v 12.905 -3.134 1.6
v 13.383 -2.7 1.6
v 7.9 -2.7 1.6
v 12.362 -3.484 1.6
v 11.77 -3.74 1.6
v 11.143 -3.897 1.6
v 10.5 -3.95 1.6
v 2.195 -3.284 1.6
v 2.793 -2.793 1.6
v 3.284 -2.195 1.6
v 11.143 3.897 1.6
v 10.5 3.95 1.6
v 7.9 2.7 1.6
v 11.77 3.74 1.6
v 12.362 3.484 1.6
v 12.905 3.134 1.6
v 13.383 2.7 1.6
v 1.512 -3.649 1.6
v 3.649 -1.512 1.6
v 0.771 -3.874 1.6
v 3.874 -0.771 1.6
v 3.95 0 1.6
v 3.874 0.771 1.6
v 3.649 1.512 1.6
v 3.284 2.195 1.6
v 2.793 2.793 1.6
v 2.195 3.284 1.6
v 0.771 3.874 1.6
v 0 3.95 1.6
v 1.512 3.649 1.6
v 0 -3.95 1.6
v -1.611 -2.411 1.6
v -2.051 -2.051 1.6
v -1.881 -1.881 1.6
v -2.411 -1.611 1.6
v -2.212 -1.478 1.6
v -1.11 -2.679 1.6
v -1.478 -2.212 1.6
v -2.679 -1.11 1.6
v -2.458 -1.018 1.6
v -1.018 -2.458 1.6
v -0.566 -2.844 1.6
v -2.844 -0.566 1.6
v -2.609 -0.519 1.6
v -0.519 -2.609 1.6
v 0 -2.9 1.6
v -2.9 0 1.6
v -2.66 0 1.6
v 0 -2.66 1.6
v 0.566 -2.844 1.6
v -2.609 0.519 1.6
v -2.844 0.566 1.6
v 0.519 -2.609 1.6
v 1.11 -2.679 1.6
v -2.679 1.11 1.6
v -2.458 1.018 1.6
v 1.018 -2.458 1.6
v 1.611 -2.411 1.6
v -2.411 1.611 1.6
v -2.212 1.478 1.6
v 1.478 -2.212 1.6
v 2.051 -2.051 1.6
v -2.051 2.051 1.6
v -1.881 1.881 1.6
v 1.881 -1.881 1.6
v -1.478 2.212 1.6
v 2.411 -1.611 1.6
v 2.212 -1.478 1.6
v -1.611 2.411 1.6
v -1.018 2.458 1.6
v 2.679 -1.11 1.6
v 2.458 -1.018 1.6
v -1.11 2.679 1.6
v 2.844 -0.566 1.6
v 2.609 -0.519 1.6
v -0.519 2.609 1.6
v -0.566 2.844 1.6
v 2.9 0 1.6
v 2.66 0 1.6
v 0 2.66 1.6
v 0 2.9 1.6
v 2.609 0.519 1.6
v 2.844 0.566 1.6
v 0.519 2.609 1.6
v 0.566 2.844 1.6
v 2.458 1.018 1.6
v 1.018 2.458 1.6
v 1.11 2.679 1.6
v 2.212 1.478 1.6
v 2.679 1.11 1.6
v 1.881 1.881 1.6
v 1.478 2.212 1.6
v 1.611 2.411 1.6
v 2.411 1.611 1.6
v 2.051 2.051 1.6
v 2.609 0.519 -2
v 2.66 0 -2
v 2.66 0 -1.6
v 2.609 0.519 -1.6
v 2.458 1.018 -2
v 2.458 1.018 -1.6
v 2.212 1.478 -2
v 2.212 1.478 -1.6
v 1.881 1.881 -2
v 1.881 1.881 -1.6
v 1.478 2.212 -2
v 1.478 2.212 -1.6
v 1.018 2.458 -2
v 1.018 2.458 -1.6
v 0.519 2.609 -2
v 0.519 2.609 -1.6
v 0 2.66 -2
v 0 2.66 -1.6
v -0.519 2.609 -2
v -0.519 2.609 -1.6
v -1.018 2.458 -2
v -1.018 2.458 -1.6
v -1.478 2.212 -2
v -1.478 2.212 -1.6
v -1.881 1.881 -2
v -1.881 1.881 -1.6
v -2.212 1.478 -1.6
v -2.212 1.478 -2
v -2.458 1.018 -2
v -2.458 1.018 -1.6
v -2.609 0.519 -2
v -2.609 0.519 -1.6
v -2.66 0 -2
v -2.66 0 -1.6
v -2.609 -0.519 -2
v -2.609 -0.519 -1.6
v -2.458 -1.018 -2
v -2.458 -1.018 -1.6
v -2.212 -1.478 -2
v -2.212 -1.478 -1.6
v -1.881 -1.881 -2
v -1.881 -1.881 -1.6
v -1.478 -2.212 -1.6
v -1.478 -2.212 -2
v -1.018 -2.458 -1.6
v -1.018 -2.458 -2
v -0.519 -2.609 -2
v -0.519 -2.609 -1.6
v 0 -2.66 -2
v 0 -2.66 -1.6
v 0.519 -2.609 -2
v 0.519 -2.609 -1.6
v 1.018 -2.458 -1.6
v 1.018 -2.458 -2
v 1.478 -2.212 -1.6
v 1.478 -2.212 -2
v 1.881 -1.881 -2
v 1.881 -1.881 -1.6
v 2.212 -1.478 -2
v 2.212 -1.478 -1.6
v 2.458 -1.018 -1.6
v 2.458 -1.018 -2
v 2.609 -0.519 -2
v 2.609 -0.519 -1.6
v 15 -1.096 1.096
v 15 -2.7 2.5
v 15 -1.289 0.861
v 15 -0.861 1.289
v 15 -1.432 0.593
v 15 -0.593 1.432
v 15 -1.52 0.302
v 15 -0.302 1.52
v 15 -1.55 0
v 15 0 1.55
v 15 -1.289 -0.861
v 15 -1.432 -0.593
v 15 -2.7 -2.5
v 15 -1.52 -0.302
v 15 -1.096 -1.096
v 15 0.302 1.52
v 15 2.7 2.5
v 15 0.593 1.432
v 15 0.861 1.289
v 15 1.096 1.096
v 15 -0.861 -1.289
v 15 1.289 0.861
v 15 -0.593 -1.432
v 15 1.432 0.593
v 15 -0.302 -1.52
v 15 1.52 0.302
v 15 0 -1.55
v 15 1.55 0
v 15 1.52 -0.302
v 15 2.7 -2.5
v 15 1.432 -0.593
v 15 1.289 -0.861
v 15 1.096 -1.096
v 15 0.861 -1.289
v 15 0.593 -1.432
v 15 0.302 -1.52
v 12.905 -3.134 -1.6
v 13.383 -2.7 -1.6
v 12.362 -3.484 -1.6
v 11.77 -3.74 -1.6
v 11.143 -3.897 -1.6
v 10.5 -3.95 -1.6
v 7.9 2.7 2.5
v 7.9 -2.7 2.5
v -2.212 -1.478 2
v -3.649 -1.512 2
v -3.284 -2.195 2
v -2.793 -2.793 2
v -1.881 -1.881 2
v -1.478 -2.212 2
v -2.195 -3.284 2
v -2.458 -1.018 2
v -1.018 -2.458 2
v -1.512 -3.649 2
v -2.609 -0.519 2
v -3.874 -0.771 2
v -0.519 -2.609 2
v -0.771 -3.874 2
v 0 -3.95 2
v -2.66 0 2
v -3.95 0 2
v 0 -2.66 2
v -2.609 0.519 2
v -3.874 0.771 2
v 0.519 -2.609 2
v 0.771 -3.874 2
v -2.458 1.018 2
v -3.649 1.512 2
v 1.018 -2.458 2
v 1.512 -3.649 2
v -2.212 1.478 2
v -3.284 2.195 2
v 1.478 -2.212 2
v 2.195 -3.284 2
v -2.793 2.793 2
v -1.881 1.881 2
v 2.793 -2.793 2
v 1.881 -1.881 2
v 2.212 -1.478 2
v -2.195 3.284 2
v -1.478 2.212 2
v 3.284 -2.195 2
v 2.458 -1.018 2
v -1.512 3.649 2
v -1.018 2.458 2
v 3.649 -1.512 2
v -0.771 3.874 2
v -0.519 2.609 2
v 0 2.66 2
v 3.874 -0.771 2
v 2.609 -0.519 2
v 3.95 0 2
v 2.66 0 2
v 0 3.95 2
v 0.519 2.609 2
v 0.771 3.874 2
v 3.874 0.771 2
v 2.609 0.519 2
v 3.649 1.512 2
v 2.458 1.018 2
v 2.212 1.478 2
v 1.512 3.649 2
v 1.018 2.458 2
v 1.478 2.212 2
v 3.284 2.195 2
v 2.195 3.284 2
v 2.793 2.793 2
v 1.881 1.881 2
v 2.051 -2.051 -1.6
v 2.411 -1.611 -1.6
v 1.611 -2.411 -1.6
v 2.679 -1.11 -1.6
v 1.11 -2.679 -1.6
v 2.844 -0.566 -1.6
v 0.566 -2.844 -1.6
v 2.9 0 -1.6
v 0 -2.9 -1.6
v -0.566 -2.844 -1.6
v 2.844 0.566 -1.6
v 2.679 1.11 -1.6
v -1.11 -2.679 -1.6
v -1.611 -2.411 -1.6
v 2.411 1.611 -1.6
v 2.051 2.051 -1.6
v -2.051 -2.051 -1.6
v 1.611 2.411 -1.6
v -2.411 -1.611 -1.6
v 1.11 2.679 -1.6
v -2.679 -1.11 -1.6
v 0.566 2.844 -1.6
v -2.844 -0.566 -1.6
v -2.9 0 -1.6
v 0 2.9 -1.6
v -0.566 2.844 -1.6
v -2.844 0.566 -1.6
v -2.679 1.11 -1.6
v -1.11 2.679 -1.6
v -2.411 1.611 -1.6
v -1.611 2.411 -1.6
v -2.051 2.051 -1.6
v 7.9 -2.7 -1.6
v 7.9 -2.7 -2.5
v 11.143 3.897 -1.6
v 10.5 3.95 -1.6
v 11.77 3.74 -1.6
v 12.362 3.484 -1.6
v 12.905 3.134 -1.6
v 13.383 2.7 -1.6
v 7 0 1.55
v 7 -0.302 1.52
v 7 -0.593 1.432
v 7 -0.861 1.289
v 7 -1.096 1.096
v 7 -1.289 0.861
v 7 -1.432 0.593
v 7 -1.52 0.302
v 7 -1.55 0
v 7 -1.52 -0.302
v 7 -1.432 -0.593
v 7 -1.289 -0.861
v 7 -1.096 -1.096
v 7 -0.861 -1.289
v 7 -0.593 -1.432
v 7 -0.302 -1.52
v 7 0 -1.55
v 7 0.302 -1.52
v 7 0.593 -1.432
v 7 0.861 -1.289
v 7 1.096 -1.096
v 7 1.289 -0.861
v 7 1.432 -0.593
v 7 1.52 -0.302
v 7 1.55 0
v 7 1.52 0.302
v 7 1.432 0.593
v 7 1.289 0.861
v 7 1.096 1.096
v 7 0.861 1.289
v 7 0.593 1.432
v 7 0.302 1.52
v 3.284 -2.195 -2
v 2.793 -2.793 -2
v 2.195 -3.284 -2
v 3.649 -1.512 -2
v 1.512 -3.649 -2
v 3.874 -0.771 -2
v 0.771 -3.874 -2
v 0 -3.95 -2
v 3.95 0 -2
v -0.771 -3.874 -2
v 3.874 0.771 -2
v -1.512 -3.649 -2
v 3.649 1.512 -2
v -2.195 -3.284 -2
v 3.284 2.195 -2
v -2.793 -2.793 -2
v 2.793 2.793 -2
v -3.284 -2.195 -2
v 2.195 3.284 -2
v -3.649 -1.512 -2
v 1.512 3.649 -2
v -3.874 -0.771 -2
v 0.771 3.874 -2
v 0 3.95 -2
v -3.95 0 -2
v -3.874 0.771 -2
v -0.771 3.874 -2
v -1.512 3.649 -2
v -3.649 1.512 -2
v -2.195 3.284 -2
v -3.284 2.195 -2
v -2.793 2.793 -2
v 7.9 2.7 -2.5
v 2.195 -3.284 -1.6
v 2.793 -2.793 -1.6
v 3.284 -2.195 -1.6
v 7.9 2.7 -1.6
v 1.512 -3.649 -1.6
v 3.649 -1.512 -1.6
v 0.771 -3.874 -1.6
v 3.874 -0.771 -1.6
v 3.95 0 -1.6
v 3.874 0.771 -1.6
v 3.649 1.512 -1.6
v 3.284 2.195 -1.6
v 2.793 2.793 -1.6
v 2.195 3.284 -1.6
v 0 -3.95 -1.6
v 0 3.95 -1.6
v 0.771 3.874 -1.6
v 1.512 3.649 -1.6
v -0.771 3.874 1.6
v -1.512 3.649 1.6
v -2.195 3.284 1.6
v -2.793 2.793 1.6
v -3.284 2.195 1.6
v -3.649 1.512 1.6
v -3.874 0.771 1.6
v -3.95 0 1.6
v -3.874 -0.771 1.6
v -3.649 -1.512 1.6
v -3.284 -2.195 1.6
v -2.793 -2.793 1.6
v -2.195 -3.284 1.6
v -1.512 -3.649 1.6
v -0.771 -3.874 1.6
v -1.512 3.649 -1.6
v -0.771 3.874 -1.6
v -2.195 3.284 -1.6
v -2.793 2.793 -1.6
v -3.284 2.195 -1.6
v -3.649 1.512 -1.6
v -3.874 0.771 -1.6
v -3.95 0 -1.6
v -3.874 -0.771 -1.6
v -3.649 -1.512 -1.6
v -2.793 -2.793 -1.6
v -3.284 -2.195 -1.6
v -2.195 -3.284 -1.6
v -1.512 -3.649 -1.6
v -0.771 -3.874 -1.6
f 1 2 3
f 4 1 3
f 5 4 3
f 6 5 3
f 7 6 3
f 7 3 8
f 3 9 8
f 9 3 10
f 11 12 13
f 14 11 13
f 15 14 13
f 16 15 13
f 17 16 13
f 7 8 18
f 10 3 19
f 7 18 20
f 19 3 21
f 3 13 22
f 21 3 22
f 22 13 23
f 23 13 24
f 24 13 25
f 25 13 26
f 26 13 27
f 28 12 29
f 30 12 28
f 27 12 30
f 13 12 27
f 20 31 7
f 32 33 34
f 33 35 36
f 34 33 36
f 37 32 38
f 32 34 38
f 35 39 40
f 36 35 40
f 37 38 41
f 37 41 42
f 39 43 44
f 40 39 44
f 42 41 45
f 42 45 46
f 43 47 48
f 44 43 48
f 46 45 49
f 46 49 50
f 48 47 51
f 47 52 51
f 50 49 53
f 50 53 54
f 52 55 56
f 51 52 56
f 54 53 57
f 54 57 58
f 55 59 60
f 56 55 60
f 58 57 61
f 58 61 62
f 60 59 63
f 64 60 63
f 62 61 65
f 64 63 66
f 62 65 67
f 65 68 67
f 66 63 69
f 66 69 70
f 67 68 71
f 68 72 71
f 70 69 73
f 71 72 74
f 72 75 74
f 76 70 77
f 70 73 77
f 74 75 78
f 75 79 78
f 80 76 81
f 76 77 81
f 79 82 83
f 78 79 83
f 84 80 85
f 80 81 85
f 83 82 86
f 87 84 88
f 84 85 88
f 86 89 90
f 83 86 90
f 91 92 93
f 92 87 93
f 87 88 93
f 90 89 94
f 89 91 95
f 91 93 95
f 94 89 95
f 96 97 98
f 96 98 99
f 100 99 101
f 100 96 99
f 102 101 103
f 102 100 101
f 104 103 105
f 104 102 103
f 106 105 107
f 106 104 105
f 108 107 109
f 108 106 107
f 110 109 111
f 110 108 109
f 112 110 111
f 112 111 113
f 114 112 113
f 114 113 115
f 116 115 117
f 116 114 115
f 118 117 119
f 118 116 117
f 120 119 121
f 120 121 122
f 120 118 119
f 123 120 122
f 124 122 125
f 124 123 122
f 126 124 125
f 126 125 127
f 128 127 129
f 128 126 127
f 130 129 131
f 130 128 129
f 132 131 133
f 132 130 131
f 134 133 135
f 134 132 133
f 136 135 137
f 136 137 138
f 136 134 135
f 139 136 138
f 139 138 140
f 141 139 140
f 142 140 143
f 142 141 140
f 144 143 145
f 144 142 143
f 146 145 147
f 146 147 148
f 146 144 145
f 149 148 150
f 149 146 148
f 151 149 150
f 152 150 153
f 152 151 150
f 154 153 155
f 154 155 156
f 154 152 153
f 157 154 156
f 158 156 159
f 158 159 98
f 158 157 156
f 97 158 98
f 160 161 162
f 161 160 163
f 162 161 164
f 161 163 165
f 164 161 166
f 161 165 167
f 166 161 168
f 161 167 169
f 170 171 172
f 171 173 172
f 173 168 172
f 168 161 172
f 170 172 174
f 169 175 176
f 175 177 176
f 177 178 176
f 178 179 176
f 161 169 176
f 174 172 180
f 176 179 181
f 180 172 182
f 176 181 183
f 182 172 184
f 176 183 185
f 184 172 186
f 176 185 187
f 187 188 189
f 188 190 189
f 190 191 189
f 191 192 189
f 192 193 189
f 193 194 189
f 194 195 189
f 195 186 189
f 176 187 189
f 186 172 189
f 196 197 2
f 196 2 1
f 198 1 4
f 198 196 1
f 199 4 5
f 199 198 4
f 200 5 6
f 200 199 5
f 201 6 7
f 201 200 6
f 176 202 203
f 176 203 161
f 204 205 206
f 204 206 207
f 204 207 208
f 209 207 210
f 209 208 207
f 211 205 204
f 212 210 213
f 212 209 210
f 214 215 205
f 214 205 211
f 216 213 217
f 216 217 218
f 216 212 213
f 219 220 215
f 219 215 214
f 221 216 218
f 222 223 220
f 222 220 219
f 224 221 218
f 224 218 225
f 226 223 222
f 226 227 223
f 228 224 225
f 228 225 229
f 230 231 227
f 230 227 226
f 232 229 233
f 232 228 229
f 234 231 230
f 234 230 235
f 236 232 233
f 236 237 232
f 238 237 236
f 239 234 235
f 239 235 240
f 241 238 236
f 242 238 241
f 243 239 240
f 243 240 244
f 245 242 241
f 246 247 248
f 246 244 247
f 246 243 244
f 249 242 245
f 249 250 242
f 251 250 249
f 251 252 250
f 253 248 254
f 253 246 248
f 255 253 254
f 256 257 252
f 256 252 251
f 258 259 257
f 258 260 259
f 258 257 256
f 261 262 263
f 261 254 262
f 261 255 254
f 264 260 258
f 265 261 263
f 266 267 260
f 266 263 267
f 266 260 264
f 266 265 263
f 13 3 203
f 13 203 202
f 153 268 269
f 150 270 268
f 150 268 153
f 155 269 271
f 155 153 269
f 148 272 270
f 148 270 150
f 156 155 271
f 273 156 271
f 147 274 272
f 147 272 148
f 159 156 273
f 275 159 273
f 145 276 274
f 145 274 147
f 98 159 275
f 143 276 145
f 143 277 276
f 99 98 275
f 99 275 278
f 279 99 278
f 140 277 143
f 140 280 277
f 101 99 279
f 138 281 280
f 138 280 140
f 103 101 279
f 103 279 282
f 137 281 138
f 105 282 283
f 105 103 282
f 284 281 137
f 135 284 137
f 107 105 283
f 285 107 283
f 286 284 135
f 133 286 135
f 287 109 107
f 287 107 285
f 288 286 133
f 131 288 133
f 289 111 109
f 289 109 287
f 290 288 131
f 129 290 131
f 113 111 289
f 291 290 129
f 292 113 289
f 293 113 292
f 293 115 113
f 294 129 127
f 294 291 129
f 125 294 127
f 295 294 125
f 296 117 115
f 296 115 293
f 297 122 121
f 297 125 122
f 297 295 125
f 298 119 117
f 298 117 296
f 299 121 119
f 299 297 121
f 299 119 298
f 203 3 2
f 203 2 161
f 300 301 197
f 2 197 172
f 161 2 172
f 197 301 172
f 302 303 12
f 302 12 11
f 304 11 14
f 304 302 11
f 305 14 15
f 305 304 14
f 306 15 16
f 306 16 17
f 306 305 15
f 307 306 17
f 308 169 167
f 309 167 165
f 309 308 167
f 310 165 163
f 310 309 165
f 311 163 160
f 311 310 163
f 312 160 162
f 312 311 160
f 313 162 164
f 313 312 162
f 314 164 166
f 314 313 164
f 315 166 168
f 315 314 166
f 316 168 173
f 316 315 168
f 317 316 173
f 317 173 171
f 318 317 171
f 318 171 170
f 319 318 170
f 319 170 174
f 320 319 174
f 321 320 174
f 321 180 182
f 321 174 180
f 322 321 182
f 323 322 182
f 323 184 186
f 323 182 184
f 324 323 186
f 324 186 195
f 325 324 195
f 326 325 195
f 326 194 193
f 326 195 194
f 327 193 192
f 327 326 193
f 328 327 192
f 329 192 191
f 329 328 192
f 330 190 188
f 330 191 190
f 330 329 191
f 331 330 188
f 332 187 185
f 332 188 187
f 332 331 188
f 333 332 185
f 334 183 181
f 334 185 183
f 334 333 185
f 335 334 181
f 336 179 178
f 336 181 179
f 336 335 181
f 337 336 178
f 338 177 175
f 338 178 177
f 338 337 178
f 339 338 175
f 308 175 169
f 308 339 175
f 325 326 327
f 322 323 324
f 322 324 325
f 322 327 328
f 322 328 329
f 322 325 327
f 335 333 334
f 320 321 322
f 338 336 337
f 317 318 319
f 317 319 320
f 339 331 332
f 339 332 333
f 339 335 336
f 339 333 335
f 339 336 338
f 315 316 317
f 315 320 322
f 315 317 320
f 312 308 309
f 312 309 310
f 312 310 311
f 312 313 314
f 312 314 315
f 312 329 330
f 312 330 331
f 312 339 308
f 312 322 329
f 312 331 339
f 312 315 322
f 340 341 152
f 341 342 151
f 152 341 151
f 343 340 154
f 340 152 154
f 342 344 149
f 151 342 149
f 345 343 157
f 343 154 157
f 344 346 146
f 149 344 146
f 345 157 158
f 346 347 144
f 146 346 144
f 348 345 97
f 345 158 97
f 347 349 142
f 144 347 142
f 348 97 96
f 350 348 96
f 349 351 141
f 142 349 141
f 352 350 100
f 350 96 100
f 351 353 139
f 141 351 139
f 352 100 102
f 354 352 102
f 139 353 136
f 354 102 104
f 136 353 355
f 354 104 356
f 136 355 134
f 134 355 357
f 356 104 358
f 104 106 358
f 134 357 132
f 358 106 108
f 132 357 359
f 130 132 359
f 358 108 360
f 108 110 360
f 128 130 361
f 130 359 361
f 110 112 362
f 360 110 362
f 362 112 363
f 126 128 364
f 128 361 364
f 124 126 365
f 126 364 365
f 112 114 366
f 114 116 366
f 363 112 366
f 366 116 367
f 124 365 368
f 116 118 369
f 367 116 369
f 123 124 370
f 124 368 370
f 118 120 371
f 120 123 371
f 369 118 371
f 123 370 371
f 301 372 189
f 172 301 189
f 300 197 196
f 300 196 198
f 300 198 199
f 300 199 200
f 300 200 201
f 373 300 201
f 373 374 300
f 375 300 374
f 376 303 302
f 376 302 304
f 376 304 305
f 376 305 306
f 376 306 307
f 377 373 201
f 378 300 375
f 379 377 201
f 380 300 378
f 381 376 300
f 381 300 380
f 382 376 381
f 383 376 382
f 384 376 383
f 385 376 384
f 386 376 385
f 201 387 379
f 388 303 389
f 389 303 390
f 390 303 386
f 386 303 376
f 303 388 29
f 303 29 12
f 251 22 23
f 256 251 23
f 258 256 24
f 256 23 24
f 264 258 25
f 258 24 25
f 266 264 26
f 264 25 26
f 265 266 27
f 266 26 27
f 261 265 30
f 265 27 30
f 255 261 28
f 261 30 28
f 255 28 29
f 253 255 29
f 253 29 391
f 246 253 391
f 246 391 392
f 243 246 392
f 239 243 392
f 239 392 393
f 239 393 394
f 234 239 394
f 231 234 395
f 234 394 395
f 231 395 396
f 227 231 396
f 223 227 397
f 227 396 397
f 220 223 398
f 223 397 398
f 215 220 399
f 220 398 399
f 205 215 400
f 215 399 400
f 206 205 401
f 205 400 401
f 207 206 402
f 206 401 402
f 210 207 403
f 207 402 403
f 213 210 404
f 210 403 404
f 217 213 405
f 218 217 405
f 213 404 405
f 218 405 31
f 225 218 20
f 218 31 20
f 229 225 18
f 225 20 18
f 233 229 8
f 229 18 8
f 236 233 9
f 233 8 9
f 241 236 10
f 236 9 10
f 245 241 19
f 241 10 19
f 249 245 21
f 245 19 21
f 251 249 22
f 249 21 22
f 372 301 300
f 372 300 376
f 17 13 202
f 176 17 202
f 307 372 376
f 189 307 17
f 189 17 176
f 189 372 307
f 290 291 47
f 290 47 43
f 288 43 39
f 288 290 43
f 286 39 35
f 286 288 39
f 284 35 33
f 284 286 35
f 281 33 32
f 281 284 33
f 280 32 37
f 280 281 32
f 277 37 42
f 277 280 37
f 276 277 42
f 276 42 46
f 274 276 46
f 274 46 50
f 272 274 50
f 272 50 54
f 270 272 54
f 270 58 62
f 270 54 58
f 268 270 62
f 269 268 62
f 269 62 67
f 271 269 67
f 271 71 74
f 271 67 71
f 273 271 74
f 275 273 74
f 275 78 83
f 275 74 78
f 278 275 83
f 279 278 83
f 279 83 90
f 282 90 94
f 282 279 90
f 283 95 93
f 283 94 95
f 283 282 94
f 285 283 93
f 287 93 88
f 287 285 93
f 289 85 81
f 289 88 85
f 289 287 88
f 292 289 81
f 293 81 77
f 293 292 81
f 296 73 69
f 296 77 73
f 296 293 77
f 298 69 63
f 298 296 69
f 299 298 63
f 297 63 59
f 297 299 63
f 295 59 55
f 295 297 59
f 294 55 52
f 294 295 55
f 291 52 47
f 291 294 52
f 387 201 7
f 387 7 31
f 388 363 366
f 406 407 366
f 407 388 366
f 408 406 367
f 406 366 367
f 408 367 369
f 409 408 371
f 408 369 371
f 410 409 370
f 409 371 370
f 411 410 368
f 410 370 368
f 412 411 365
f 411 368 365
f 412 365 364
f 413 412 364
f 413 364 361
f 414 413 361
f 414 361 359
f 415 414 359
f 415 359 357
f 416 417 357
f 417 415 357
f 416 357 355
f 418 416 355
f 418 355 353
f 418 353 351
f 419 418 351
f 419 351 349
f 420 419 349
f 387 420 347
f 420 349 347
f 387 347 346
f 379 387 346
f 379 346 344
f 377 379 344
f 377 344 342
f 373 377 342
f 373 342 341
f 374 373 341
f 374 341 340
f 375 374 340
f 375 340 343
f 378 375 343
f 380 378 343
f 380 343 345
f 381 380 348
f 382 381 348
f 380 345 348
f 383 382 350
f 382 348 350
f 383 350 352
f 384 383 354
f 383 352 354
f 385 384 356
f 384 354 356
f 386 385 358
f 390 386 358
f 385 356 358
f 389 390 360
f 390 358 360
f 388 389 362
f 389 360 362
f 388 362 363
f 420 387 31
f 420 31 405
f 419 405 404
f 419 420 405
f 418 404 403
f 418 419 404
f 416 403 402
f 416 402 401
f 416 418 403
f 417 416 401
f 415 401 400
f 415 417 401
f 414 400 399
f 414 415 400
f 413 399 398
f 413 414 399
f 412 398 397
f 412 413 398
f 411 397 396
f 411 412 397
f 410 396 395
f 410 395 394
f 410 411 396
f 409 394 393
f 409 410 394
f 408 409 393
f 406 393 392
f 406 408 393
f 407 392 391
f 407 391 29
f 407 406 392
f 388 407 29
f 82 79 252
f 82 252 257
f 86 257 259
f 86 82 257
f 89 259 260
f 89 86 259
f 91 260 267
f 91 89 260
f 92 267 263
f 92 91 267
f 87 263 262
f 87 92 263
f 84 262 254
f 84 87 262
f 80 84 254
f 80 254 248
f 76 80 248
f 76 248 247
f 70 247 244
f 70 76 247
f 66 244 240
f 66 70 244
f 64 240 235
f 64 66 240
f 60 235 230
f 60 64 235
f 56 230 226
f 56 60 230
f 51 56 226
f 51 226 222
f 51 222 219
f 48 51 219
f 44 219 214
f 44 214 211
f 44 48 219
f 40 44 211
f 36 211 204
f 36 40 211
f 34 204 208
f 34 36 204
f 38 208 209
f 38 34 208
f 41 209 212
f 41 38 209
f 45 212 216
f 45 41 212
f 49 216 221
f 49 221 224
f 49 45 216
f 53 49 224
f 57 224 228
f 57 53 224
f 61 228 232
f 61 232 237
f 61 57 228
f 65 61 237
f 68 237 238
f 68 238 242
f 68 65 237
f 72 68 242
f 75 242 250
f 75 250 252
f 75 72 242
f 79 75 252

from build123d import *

# Parameters (mm, degrees)
F_01_START                              = -1.6
F_01_SOCKET_HEAD_AND_SHANK_DEPTH        = 3.2
F_02_START                              = -2
S02_ARTICULATION_OPENING_R              = 2.9
F_02_ARTICULATION_OPENING_DEPTH         = 4
F_03_START                              = -2
S03_CAPTIVE_SPHERICAL_SEAT_LIP_1_R      = 3.95
S03_CAPTIVE_SPHERICAL_SEAT_LIP_1_R_2    = 2.66
F_03_CAPTIVE_SPHERICAL_SEAT_LIP_1_DEPTH = 0.4
F_04_START                              = 1.6
S04_CAPTIVE_SPHERICAL_SEAT_LIP_2_R      = 3.95
S04_CAPTIVE_SPHERICAL_SEAT_LIP_2_R_2    = 2.66
F_04_CAPTIVE_SPHERICAL_SEAT_LIP_2_DEPTH = 0.4
F_05_START                              = -2.5
S05_ROD_THREAD_BOSS_W                   = 7.1
S05_ROD_THREAD_BOSS_H                   = 5.4
F_05_ROD_THREAD_BOSS_DEPTH              = 5
F_06_START                              = 7
S06_M3_INTERNAL_THREAD_ENVELOPE_R       = 1.55
F_06_M3_INTERNAL_THREAD_ENVELOPE_DEPTH  = 9


with BuildPart() as part:
    # S01 - Socket head and shank → 01 - Socket head and shank (new body)
    with BuildSketch(Plane.XY.offset(F_01_START)):
        with BuildLine():
            Line((0, 3.95), (10.5, 3.95))
            ThreePointArc((10.5, 3.95), (14.45, 0), (10.5, -3.95))
            Line((10.5, -3.95), (0, -3.95))
            ThreePointArc((0, -3.95), (-3.95, 0), (0, 3.95))
        make_face()
    extrude(amount=F_01_SOCKET_HEAD_AND_SHANK_DEPTH)

    # S02 - Articulation opening → 02 - Articulation opening (cut)
    with BuildSketch(Plane.XY.offset(F_02_START)):
        Circle(S02_ARTICULATION_OPENING_R)
    extrude(amount=F_02_ARTICULATION_OPENING_DEPTH, mode=Mode.SUBTRACT)

    # S03 - Captive spherical seat lip 1 → 03 - Captive spherical seat lip 1 (add)
    with BuildSketch(Plane.XY.offset(F_03_START)):
        Circle(S03_CAPTIVE_SPHERICAL_SEAT_LIP_1_R)
        Circle(S03_CAPTIVE_SPHERICAL_SEAT_LIP_1_R_2, mode=Mode.SUBTRACT)
    extrude(amount=F_03_CAPTIVE_SPHERICAL_SEAT_LIP_1_DEPTH)

    # S04 - Captive spherical seat lip 2 → 04 - Captive spherical seat lip 2 (add)
    with BuildSketch(Plane.XY.offset(F_04_START)):
        Circle(S04_CAPTIVE_SPHERICAL_SEAT_LIP_2_R)
        Circle(S04_CAPTIVE_SPHERICAL_SEAT_LIP_2_R_2, mode=Mode.SUBTRACT)
    extrude(amount=F_04_CAPTIVE_SPHERICAL_SEAT_LIP_2_DEPTH)

    # S05 - Rod thread boss → 05 - Rod thread boss (add)
    with BuildSketch(Plane.XY.offset(F_05_START)):
        with Locations((11.45, 0)):
            Rectangle(S05_ROD_THREAD_BOSS_W, S05_ROD_THREAD_BOSS_H)
    extrude(amount=F_05_ROD_THREAD_BOSS_DEPTH)

    # S06 - M3 internal thread envelope → 06 - M3 internal thread envelope (cut)
    with BuildSketch(Plane(origin=(0, 0, 0), x_dir=(0, 0, -1), z_dir=(1, 0, 0)).offset(F_06_START)):
        Circle(S06_M3_INTERNAL_THREAD_ENVELOPE_R)
    extrude(amount=F_06_M3_INTERNAL_THREAD_ENVELOPE_DEPTH, mode=Mode.SUBTRACT)


solid = part.part
